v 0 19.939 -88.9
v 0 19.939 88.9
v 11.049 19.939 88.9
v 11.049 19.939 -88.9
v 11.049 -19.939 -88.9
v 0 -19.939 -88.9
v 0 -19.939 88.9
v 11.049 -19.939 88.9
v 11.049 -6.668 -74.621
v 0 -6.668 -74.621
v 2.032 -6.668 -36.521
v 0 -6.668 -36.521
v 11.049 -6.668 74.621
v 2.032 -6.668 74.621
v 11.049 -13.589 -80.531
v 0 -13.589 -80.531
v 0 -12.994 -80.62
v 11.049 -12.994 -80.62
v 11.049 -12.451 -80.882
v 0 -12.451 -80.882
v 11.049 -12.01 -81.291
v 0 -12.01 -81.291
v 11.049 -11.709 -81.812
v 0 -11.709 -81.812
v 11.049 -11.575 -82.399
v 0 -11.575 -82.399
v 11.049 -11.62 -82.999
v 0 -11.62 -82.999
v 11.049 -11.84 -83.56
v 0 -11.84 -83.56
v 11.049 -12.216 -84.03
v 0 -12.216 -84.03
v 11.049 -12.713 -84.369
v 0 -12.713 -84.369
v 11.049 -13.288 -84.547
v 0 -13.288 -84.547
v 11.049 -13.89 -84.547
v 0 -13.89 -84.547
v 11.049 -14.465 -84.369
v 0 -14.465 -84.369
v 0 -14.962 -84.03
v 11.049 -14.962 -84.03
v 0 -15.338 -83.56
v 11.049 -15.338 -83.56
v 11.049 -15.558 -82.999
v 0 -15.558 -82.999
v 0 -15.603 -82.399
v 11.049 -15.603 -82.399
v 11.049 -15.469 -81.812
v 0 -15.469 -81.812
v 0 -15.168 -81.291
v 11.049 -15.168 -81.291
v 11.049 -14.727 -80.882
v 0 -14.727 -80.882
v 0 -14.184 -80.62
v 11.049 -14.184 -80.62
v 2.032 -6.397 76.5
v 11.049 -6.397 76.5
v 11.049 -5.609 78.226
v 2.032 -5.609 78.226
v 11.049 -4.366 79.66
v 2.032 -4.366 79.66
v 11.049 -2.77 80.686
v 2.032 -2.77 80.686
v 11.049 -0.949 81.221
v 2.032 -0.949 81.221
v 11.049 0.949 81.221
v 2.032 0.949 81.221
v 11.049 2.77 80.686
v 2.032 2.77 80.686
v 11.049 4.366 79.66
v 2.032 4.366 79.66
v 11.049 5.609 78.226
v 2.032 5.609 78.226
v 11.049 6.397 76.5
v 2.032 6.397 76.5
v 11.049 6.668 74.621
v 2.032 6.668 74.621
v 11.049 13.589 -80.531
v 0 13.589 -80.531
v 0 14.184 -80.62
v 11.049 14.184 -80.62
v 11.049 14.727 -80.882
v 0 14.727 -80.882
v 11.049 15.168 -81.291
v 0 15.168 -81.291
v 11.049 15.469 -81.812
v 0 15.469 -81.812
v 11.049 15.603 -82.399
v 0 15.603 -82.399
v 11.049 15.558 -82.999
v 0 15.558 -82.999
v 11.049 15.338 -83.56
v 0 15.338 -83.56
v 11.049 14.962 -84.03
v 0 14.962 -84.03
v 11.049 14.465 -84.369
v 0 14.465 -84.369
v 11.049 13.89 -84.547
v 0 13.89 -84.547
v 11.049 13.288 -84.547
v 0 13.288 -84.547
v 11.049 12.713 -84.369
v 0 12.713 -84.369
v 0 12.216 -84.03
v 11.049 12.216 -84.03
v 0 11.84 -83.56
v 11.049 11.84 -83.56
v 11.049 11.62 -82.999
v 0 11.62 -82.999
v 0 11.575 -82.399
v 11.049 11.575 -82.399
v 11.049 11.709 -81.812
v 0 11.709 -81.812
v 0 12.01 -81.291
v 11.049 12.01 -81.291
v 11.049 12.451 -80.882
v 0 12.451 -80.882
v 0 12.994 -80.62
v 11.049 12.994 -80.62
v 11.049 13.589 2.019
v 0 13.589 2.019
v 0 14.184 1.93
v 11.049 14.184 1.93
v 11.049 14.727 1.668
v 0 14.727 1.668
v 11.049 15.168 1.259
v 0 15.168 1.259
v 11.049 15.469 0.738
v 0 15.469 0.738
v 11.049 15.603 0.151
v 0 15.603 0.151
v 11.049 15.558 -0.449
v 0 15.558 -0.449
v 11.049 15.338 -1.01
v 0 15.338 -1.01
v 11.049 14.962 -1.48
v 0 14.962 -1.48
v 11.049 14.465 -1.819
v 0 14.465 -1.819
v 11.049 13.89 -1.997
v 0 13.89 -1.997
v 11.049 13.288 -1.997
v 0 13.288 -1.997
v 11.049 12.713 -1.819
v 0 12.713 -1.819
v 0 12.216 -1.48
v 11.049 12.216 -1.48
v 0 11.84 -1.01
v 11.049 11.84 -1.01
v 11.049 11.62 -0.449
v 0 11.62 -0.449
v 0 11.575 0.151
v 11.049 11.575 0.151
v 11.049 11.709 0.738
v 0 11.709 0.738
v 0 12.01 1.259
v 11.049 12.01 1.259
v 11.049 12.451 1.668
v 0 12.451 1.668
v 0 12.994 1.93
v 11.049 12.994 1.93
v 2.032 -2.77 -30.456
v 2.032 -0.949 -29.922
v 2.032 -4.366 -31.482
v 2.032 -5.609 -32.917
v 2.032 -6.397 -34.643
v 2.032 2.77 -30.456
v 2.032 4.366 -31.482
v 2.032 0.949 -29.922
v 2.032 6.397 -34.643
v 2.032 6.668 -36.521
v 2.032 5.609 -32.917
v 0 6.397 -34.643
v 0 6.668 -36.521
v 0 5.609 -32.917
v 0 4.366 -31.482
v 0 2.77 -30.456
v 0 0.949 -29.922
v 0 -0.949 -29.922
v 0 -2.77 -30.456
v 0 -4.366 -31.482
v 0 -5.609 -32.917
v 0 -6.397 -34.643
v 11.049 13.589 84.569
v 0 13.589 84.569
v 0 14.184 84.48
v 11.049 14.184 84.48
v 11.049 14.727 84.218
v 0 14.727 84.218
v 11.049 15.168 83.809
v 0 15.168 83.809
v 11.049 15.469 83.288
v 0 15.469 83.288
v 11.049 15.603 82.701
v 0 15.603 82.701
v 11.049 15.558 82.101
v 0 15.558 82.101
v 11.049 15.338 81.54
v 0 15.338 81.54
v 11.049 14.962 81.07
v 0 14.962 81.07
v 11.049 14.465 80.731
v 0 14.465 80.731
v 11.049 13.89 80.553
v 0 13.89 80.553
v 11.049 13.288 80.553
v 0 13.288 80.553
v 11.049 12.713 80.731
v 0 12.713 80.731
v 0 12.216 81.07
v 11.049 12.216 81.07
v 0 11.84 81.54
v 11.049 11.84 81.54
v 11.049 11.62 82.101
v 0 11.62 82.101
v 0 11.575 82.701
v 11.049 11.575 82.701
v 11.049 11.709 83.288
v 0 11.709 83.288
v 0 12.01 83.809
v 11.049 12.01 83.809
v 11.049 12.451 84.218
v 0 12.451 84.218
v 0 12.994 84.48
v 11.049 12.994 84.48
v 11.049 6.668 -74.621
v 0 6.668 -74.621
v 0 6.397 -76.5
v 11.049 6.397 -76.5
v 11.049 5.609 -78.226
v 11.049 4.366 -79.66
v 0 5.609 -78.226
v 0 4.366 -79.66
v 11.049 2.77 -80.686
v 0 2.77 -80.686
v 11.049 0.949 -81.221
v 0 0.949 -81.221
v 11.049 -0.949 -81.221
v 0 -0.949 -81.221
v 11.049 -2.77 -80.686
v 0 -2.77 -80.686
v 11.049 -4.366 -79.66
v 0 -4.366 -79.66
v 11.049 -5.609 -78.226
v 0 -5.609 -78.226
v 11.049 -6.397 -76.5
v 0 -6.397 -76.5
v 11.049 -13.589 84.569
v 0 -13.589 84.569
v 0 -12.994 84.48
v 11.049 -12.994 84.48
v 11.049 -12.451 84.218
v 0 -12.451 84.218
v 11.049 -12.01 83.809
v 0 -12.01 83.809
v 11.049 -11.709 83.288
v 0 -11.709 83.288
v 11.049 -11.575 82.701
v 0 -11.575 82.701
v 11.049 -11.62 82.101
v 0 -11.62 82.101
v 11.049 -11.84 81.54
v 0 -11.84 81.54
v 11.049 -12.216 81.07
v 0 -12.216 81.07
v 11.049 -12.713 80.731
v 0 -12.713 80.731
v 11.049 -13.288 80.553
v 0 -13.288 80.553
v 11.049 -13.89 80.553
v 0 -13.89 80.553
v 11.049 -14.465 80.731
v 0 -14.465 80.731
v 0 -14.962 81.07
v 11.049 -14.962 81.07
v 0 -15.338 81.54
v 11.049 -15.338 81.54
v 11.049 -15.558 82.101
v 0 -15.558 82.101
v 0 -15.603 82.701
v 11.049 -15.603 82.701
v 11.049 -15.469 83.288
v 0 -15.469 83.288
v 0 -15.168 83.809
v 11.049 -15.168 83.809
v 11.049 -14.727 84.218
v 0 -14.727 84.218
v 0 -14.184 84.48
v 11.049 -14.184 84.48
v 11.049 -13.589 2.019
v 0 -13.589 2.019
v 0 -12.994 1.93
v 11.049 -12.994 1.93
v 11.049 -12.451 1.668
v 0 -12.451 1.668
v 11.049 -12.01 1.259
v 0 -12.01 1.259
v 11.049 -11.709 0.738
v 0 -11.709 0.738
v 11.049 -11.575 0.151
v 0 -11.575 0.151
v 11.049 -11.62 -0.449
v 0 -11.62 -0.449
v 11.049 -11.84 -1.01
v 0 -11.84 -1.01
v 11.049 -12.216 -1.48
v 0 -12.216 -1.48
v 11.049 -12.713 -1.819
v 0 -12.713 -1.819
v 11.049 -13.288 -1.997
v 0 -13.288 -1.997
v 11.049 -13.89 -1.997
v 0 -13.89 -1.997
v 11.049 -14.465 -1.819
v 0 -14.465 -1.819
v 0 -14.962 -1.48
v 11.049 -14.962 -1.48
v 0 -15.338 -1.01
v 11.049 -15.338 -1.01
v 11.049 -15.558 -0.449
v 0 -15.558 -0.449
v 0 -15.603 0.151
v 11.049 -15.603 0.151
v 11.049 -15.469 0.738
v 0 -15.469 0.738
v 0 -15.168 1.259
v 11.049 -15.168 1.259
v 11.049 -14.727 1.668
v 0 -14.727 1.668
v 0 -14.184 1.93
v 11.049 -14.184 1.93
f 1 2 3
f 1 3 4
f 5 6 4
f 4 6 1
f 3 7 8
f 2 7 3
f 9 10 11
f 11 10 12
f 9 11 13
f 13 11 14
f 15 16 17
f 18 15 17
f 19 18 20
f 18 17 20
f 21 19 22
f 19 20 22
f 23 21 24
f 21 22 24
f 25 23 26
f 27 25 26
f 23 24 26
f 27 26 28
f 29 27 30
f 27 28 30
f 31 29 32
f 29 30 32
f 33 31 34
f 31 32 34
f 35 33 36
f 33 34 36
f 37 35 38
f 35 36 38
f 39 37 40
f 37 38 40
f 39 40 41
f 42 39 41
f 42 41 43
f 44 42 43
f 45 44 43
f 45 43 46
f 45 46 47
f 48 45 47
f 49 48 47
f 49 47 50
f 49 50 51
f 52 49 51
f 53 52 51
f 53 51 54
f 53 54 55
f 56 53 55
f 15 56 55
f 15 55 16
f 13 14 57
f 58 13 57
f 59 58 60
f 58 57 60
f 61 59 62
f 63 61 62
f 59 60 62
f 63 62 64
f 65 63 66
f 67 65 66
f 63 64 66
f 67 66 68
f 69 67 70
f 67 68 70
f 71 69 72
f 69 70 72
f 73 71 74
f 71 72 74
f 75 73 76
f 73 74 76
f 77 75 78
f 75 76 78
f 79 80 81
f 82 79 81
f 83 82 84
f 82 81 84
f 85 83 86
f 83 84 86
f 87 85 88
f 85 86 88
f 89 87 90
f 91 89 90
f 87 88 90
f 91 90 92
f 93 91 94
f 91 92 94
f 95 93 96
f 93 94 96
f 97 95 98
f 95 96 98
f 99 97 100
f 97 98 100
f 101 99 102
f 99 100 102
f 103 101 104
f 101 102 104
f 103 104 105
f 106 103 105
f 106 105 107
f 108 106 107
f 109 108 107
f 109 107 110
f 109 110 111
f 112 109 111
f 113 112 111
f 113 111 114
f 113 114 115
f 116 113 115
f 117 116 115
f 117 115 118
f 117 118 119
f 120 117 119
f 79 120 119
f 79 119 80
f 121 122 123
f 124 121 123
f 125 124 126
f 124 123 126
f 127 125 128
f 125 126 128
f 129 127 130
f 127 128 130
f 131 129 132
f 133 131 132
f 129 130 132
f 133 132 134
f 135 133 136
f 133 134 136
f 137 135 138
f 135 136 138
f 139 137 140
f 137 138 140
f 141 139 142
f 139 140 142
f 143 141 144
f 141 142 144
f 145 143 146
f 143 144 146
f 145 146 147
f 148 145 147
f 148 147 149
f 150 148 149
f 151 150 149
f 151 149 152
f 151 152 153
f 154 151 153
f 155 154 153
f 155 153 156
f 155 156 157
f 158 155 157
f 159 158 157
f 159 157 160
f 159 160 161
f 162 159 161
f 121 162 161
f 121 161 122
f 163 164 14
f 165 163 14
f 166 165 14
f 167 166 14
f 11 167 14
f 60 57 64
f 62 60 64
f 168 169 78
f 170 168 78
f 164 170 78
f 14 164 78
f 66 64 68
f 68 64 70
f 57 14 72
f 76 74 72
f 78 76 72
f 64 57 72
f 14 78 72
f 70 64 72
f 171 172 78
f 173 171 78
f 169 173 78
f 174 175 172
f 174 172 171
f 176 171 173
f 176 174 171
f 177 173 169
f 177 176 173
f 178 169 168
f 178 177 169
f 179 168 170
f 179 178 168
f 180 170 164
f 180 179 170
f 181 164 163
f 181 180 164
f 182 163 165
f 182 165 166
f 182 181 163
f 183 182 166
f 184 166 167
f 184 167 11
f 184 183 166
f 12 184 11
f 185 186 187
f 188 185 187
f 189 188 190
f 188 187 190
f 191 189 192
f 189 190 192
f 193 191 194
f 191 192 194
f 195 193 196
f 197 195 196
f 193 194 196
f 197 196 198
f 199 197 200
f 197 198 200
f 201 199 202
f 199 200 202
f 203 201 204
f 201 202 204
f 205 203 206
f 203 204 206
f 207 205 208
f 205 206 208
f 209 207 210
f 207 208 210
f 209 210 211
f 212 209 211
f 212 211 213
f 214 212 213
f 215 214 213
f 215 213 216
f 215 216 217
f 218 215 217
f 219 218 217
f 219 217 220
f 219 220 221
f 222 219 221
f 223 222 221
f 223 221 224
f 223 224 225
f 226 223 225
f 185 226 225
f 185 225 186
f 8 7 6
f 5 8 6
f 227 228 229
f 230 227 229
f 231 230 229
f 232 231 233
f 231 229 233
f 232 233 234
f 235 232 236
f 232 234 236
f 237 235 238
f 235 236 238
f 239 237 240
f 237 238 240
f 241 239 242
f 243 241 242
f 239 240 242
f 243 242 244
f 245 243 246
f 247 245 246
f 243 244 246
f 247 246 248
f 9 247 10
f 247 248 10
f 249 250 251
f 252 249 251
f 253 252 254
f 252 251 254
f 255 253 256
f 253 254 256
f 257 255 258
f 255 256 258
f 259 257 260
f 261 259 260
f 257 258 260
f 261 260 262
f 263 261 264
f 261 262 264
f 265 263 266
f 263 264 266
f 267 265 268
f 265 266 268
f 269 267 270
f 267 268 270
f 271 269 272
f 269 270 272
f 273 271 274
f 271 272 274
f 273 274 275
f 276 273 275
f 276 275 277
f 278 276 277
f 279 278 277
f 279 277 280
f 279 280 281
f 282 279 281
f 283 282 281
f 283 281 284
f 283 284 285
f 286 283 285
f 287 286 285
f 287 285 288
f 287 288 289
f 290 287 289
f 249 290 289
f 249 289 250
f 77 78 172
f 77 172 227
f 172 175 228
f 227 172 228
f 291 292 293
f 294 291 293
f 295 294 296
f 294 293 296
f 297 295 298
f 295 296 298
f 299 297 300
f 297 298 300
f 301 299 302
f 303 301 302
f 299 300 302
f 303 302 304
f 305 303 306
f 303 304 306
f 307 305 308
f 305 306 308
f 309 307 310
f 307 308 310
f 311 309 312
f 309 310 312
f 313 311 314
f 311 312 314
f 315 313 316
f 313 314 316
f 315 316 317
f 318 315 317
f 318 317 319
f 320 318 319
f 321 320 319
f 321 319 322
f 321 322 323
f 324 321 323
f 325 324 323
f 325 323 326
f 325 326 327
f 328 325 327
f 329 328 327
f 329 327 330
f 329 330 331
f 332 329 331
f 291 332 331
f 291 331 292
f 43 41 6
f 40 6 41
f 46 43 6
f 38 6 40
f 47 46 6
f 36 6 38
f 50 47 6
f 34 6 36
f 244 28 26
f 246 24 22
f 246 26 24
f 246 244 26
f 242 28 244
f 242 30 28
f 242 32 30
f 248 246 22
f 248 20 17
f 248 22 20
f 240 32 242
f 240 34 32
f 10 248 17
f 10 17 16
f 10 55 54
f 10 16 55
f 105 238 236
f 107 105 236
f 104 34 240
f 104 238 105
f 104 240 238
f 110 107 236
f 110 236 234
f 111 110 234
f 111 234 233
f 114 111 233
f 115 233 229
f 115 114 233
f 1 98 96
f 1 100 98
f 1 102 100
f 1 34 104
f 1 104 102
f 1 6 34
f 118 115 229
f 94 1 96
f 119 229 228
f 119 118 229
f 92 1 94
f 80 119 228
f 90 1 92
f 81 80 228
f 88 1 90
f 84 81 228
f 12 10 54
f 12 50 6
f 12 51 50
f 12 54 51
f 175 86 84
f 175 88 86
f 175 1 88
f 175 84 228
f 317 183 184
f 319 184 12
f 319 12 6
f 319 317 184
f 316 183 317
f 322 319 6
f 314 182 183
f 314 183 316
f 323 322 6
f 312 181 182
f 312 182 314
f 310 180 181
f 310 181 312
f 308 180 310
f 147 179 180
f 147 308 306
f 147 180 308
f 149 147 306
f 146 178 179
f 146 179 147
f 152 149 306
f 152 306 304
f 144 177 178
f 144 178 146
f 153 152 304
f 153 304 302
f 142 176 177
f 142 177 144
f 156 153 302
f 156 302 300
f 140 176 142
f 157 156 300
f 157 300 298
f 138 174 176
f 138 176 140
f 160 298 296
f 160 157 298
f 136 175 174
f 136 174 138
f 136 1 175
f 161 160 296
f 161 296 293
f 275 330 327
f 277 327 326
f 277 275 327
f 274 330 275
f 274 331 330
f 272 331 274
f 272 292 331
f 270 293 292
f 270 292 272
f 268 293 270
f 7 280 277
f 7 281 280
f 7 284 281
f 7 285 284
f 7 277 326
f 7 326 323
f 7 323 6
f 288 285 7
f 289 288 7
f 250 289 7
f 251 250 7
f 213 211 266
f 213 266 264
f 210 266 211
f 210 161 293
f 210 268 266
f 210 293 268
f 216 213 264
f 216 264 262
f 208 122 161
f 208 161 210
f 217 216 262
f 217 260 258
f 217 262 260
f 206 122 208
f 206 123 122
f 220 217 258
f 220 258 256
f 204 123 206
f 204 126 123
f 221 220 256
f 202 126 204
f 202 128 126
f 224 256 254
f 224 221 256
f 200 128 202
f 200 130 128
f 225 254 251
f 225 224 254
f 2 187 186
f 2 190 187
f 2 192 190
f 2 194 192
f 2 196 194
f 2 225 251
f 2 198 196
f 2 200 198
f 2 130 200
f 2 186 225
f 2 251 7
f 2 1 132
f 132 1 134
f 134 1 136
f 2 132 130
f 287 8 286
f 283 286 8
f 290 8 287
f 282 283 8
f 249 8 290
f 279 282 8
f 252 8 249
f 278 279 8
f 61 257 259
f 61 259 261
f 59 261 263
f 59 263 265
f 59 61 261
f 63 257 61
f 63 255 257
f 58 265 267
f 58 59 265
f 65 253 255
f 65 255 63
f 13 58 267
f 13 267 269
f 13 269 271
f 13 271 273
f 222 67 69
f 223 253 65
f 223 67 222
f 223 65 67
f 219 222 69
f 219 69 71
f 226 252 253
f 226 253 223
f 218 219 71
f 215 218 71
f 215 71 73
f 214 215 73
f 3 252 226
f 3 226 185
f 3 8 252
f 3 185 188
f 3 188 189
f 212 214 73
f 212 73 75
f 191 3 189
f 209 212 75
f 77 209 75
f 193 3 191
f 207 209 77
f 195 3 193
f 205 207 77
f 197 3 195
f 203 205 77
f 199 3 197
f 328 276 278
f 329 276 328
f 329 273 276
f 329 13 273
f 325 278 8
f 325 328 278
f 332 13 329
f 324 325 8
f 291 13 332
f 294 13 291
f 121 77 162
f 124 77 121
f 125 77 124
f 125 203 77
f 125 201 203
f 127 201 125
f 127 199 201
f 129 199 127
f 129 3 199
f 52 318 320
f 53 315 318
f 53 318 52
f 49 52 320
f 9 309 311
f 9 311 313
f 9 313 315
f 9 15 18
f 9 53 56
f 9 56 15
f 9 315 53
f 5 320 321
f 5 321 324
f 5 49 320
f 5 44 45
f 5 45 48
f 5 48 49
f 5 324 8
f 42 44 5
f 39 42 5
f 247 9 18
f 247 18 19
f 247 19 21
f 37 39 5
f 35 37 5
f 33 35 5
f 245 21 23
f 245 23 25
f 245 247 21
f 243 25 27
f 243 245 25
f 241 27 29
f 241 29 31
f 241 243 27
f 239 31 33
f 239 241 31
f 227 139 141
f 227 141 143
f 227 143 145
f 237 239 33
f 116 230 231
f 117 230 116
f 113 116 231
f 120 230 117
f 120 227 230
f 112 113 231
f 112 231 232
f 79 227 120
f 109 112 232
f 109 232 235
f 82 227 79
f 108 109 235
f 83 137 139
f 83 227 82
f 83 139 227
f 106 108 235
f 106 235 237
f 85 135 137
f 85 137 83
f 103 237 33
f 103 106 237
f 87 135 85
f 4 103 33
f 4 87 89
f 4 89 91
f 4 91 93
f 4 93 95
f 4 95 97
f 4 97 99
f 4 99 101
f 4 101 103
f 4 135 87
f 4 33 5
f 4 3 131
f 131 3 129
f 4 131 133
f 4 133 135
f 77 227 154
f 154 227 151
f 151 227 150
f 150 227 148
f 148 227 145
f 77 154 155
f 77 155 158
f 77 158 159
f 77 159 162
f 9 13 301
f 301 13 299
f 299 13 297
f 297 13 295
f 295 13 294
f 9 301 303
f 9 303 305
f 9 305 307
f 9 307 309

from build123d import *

# Parameters (mm, degrees)
SKETCH1_W              = 177.8
SKETCH1_H              = 39.878
BOSS_EXTRUDE1_DEPTH    = 11.049
F_10_32_TAPPED_HOLE1_D = 4.0386
BOSS_EXTRUDE2_DEPTH    = 2.032


with BuildPart() as part:
    # Sketch1 → Boss-Extrude1 (new body)
    with BuildSketch(Plane(origin=(0, 0, 0), x_dir=(0, 0, -1), z_dir=(1, 0, 0))):
        Rectangle(SKETCH1_W, SKETCH1_H)
        with BuildLine():
            Line((-74.621306688, 6.6675), (74.621306688, 6.6675))
            ThreePointArc((74.621306688, 6.6675), (81.288806688, 0), (74.621306688, -6.6675))
            Line((74.621306688, -6.6675), (-74.621306688, -6.6675))
            ThreePointArc((-74.621306688, -6.6675), (-81.288806688, 0), (-74.621306688, 6.6675))
        make_face(mode=Mode.SUBTRACT)
    extrude(amount=BOSS_EXTRUDE1_DEPTH)

    # #10-32 Tapped Hole1 (through all)
    with Locations(Plane(origin=(11.049, 0, 0), x_dir=(0, 0, -1), z_dir=(1, 0, 0))):
        with Locations((-82.55, 13.589), (-82.55, -13.589), (0, -13.589), (82.55, -13.589), (82.55, 13.589), (0, 13.589)):
            Hole(F_10_32_TAPPED_HOLE1_D / 2)

    # Sketch5 → Boss-Extrude2 (add)
    with BuildSketch(Plane.ZY):
        with BuildLine():
            Line((-36.521306688, -6.6675), (74.621306688, -6.6675))
            ThreePointArc((74.621306688, -6.6675), (81.288806688, 0), (74.621306688, 6.6675))
            Line((74.621306688, 6.6675), (-36.521306688, 6.6675))
            ThreePointArc((-36.521306688, 6.6675), (-29.853806688, 0), (-36.521306688, -6.6675))
        make_face()
    extrude(amount=-BOSS_EXTRUDE2_DEPTH)


solid = part.part
